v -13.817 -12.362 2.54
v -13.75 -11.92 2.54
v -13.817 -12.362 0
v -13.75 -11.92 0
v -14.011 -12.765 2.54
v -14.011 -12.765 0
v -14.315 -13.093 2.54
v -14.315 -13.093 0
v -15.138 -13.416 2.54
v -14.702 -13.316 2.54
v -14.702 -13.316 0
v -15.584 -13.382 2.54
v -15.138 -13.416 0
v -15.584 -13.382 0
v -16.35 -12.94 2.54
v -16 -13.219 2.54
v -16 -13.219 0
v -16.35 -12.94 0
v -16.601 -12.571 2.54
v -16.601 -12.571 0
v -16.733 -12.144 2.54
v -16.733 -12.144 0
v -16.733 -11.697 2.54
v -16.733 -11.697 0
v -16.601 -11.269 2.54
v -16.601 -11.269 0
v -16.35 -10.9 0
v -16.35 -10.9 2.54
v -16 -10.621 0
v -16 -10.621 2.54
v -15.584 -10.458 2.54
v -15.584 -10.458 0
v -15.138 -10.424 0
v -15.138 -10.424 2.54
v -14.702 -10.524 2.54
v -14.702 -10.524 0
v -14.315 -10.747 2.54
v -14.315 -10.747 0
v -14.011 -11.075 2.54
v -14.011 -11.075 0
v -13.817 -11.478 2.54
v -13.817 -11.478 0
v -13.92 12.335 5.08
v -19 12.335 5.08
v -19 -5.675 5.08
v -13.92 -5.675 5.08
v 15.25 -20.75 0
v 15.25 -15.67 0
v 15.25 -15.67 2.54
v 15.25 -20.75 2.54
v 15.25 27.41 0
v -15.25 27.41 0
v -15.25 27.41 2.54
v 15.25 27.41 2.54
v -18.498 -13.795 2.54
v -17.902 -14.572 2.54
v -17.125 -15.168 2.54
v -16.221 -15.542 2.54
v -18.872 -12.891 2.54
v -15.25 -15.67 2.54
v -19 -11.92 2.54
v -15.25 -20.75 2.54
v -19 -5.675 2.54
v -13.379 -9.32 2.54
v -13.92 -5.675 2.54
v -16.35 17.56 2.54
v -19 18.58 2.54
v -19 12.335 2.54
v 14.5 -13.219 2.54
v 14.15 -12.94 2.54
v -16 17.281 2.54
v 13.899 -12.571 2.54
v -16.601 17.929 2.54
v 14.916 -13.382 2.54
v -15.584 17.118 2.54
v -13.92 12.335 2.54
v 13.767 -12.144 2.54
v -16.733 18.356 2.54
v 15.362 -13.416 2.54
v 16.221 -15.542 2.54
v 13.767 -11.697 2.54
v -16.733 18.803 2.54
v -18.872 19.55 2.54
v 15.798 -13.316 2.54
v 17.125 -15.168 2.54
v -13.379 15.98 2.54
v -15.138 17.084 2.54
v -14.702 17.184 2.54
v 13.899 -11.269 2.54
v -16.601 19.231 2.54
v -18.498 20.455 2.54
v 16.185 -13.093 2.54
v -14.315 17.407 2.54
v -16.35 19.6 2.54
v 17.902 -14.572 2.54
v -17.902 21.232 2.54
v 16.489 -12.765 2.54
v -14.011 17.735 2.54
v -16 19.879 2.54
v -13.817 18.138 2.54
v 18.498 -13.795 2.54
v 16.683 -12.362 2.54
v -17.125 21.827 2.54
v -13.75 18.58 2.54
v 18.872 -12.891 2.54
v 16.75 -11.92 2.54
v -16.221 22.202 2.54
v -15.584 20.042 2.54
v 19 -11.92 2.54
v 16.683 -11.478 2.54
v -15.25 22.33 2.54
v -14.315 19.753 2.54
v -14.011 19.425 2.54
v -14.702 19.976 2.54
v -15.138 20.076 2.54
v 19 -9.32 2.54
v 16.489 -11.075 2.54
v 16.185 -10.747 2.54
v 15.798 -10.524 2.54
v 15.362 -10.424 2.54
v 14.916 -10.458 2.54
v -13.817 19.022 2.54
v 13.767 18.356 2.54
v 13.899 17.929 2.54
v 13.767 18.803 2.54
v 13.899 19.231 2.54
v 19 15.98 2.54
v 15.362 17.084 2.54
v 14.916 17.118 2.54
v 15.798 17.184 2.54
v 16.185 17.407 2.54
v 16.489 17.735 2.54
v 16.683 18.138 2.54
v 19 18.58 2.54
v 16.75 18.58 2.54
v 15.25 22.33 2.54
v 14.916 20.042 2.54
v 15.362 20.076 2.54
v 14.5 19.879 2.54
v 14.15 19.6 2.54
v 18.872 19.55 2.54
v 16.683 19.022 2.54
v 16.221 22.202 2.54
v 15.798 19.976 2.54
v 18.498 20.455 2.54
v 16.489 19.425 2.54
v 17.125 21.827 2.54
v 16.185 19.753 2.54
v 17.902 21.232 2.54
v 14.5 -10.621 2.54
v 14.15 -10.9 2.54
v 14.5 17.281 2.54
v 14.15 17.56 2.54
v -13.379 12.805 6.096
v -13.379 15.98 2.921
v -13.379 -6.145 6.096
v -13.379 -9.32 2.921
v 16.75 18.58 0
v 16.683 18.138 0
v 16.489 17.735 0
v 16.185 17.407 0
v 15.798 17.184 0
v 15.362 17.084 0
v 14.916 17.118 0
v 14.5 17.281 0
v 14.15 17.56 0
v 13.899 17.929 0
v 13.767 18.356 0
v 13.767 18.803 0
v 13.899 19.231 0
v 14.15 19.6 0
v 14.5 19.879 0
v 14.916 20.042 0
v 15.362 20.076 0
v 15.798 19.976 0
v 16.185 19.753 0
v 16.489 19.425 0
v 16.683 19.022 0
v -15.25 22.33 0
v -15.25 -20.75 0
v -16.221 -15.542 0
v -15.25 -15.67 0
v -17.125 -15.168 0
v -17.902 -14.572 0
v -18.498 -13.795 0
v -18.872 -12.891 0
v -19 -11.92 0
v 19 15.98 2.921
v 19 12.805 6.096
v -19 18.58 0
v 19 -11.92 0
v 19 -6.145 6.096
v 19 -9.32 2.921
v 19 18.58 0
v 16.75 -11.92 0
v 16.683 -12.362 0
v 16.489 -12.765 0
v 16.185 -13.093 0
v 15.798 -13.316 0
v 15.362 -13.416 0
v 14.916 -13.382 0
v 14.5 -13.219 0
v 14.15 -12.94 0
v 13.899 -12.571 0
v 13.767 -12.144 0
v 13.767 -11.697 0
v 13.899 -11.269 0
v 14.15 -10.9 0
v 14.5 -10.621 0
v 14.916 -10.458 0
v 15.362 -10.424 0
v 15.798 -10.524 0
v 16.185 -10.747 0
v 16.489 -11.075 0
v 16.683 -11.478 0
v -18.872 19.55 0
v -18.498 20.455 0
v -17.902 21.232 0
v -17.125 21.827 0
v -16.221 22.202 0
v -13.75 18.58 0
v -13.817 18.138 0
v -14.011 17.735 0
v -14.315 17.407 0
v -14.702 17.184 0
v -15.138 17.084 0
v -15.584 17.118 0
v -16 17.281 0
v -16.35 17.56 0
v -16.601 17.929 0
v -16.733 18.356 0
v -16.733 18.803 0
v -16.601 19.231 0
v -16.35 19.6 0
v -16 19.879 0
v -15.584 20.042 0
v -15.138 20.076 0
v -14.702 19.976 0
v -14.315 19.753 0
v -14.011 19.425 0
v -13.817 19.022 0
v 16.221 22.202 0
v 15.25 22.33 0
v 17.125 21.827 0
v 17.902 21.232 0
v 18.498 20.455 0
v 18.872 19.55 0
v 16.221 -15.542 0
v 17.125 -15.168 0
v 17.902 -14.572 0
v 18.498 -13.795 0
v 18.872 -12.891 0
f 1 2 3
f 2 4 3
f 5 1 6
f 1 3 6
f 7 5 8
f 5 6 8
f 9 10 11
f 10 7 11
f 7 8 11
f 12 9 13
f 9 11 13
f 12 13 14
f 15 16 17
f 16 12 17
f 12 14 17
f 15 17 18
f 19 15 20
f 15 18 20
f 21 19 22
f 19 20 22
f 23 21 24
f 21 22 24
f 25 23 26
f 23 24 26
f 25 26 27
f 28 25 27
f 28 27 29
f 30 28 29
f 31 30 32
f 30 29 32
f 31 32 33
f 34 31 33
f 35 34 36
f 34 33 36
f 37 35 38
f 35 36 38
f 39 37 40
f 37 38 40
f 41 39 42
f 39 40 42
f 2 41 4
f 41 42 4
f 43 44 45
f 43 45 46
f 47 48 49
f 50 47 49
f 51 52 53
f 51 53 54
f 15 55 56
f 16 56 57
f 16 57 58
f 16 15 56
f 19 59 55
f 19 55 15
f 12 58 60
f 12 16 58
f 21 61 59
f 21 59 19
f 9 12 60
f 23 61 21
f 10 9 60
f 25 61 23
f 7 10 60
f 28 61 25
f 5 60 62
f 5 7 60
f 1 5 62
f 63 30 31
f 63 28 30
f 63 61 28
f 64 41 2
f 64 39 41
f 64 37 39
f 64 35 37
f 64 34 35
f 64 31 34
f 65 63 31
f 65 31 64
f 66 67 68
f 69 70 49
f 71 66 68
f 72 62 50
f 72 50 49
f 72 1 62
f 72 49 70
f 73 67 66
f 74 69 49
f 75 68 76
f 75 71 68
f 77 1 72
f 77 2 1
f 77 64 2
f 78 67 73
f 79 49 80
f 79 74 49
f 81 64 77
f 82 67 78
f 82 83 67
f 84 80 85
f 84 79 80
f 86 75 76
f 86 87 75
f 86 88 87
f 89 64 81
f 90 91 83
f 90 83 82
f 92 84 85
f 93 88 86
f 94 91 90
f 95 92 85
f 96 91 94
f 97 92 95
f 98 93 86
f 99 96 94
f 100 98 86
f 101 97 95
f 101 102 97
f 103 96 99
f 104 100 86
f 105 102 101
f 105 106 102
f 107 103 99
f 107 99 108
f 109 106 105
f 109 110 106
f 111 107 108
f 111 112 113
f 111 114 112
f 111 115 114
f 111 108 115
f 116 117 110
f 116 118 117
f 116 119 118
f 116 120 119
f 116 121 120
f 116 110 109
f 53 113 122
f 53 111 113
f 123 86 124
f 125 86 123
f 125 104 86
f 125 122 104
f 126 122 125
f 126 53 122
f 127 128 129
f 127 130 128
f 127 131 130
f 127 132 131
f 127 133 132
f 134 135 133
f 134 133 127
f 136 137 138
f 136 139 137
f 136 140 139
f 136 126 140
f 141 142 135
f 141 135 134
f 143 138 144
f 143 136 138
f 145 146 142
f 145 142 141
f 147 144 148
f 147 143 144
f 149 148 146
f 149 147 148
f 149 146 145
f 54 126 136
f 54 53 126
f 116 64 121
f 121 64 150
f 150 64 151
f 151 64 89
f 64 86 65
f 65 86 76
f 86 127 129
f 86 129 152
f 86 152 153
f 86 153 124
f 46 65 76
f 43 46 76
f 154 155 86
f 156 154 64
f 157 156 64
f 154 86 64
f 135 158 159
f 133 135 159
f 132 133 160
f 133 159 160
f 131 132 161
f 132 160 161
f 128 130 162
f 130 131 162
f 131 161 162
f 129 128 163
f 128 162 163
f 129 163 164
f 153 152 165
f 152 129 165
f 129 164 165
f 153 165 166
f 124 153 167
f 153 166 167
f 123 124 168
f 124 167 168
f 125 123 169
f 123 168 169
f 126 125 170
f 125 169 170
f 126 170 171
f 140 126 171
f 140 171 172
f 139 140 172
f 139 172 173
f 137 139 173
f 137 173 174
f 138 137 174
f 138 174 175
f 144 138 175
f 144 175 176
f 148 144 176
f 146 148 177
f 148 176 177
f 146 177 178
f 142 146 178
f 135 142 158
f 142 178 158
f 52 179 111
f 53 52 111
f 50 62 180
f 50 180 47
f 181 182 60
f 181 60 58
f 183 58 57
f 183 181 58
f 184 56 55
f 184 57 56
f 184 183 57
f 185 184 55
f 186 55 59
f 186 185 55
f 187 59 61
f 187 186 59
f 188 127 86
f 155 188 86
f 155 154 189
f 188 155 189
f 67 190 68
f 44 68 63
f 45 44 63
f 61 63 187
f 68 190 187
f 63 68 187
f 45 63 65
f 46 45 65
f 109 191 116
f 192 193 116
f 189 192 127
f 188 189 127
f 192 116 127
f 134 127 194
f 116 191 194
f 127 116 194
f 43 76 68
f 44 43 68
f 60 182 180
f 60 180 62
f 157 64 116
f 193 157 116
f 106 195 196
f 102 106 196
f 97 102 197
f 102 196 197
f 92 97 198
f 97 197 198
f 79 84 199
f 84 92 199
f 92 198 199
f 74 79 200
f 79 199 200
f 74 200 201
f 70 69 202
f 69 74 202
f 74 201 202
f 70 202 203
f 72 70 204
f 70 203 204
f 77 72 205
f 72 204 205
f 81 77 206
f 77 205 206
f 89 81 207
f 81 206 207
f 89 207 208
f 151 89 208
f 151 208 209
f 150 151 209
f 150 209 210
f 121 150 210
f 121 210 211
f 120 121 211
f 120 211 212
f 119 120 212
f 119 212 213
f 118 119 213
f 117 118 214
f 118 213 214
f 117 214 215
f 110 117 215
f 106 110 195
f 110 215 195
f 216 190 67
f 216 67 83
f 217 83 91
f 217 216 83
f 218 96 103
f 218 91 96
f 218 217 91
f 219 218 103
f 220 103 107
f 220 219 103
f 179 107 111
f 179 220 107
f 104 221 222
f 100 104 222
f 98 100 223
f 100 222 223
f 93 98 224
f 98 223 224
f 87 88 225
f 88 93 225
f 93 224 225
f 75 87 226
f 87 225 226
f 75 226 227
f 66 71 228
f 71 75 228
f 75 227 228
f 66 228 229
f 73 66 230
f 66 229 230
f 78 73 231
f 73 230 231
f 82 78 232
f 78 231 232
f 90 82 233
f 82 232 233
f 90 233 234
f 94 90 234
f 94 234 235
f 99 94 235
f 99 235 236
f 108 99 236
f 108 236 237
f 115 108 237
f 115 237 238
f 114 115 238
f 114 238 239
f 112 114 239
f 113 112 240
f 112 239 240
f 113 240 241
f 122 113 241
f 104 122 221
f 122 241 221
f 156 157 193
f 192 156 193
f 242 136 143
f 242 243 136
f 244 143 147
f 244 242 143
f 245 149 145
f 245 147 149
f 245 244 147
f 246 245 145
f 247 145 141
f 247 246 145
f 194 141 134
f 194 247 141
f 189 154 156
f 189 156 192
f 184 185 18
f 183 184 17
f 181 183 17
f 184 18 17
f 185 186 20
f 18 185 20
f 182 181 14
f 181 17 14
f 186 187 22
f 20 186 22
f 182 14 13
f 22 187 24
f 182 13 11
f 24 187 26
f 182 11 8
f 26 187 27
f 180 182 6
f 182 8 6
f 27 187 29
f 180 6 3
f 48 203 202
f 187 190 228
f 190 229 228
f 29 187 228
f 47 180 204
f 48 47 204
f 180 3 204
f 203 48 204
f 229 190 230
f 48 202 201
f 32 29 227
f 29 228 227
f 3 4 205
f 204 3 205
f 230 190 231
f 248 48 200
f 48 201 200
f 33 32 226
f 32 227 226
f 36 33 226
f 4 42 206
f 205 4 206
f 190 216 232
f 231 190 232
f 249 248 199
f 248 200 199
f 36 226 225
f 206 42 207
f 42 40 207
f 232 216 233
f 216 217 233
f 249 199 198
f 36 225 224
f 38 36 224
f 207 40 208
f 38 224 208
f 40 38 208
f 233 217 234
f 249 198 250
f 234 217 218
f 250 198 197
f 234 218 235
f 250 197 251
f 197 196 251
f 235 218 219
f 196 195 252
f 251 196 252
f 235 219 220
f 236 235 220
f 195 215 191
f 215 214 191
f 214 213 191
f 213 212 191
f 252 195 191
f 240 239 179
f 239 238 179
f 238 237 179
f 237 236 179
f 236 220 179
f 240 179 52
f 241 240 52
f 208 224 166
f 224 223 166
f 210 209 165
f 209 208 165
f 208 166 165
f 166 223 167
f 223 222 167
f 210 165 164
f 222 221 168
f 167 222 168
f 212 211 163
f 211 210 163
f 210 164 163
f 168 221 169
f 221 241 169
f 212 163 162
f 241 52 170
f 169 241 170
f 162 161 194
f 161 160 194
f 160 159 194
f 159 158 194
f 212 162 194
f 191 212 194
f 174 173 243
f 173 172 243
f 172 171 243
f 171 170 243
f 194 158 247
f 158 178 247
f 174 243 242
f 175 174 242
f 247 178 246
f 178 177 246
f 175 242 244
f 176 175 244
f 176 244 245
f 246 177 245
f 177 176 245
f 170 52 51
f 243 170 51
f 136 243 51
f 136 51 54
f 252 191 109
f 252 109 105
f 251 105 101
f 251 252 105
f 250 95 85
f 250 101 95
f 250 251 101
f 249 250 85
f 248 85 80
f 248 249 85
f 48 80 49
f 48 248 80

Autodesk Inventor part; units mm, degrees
ref_plane "YZ Plane" through (0, 0, 0) normal (1, 0, 0) x (0, 1, 0)
ref_plane "XZ Plane" through (0, 0, 0) normal (0, 1, 0) x (-1, 0, 0)
ref_plane "XY Plane" through (0, 0, 0) normal (0, 0, 1) x (1, 0, 0)
sketch "Sketch1" plane through (0, 0, 0) normal (0, 0, 1) x (1, 0, 0)
  arc A0 (15.6734, 13.8392) -> (14.75, 12.1537) centre (16.75, 12.1537) ccw construction
  line L0 (15.6734, 13.8392) -> (18.0766, 15.3743) construction
  arc A1 (18.0766, 15.3743) -> (19, 17.0598) centre (17, 17.0598) ccw construction
  line L1 (19, 17.0598) -> (19, 30.7058) construction
  arc A2 (24.5861, 42.384) -> (19, 30.7058) centre (34, 30.7058) ccw construction
  line L2 (24.5861, 42.384) -> (28.2876, 45.3677) construction
  arc A3 (28.2876, 45.3677) -> (28.7404, 49.5861) centre (26.4048, 47.7034) ccw construction
  line L3 (28.7404, 49.5861) -> (26.2301, 52.7003) construction
  arc A4 (26.2301, 52.7003) -> (22.0117, 53.1532) centre (23.8944, 50.8175) ccw construction
  line L4 (22.0117, 53.1532) -> (11.4653, 44.6517) construction
  arc A5 (2.0515, 41.3299) -> (11.4653, 44.6517) centre (2.0515, 56.3299) ccw construction
  line L5 (2.0515, 41.3299) -> (-2.0515, 41.3299) construction
  arc A6 (-11.4653, 44.6517) -> (-2.0515, 41.3299) centre (-2.0515, 56.3299) ccw construction
  line L6 (-11.4653, 44.6517) -> (-22.0117, 53.1532) construction
  arc A7 (-22.0117, 53.1532) -> (-26.2301, 52.7003) centre (-23.8944, 50.8175) ccw construction
  line L7 (-26.2301, 52.7003) -> (-28.7404, 49.5861) construction
  arc A8 (-28.7404, 49.5861) -> (-28.2876, 45.3677) centre (-26.4048, 47.7034) ccw construction
  line L8 (-28.2876, 45.3677) -> (-24.5861, 42.384) construction
  arc A9 (-19, 30.7058) -> (-24.5861, 42.384) centre (-34, 30.7058) ccw construction
  line L9 (-19, 30.7058) -> (-19, 17.0598) construction
  arc A10 (-19, 17.0598) -> (-18.0766, 15.3743) centre (-17, 17.0598) ccw construction
  line L10 (-18.0766, 15.3743) -> (-15.6734, 13.8392) construction
  arc A11 (-14.75, 12.1537) -> (-15.6734, 13.8392) centre (-16.75, 12.1537) ccw construction
  line L11 (-14.75, 12.1537) -> (-14.75, -5.494) construction
  arc A12 (-15.6734, -7.1795) -> (-14.75, -5.494) centre (-16.75, -5.494) ccw construction
  line L12 (-15.6734, -7.1795) -> (-18.0766, -8.7146) construction
  arc A13 (-18.0766, -8.7146) -> (-19, -10.4001) centre (-17, -10.4001) ccw construction
  line L13 (-19, -10.4001) -> (-19, -30.7058) construction
  arc A14 (-24.5861, -42.384) -> (-19, -30.7058) centre (-34, -30.7058) ccw construction
  line L14 (-24.5861, -42.384) -> (-28.2876, -45.3677) construction
  arc A15 (-28.2876, -45.3677) -> (-28.7404, -49.5861) centre (-26.4048, -47.7034) ccw construction
  line L15 (-28.7404, -49.5861) -> (-26.2301, -52.7003) construction
  arc A16 (-26.2301, -52.7003) -> (-22.0117, -53.1532) centre (-23.8944, -50.8175) ccw construction
  line L16 (-22.0117, -53.1532) -> (-11.4653, -44.6517) construction
  arc A17 (-2.0515, -41.3299) -> (-11.4653, -44.6517) centre (-2.0515, -56.3299) ccw construction
  line L17 (-2.0515, -41.3299) -> (2.0515, -41.3299) construction
  arc A18 (11.4653, -44.6517) -> (2.0515, -41.3299) centre (2.0515, -56.3299) ccw construction
  line L18 (11.4653, -44.6517) -> (22.0117, -53.1532) construction
  arc A19 (22.0117, -53.1532) -> (26.2301, -52.7003) centre (23.8944, -50.8175) ccw construction
  line L19 (26.2301, -52.7003) -> (28.7404, -49.5861) construction
  arc A20 (28.7404, -49.5861) -> (28.2876, -45.3677) centre (26.4048, -47.7034) ccw construction
  line L20 (28.2876, -45.3677) -> (24.5861, -42.384) construction
  arc A21 (19, -30.7058) -> (24.5861, -42.384) centre (34, -30.7058) ccw construction
  line L21 (19, -30.7058) -> (19, -10.4001) construction
  arc A22 (19, -10.4001) -> (18.0766, -8.7146) centre (17, -10.4001) ccw construction
  line L22 (18.0766, -8.7146) -> (15.6734, -7.1795) construction
  arc A23 (14.75, -5.494) -> (15.6734, -7.1795) centre (16.75, -5.494) ccw construction
  line L23 (14.75, -5.494) -> (14.75, 12.1537) construction
  spline S0 degree 3 poles (8.2673, 8.7575) (8.2937, 7.6146) (8.3178, 6.4713) (8.3615, 4.1764) (8.3811, 3.024) (8.3985, 1.872) knots 0 0 0 0 0.342955 0.342955 0.688597 0.688597 0.688597 0.688597 construction
  arc A24 (7.2587, 0.991) -> (8.3985, 1.872) centre (7.4986, 1.8584) ccw construction
  line L24 (7.2587, 0.991) -> (3.6122, 1.9996) construction
  arc A25 (3.0306, 3.4932) -> (3.6122, 1.9996) centre (3.8788, 2.9634) ccw construction
  line L25 (3.0306, 3.4932) -> (6.6042, 9.2136) construction
  arc A26 (8.2673, 8.7575) -> (6.6042, 9.2136) centre (7.3675, 8.7367) ccw construction
  line L26 (-3.336, -2.3124) -> (-0.2664, -1.464) construction
  arc A27 (0.2664, -1.464) -> (-0.2664, -1.464) centre (0, -2.4278) ccw construction
  line L27 (0.2664, -1.464) -> (3.336, -2.3124) construction
  arc A28 (3.9177, -3.8061) -> (3.336, -2.3124) centre (3.0696, -3.2763) ccw construction
  line L28 (3.9177, -3.8061) -> (0.8481, -8.7198) construction
  arc A29 (-0.8481, -8.7198) -> (0.8481, -8.7198) centre (0, -8.19) ccw construction
  line L29 (-0.8481, -8.7198) -> (-3.9177, -3.8061) construction
  arc A30 (-3.336, -2.3124) -> (-3.9177, -3.8061) centre (-3.0696, -3.2763) ccw construction
  line L30 (6.2794, 18.6976) -> (1.9507, 19.9359) construction
  arc A31 (1.3777, 21.4271) -> (1.9507, 19.9359) centre (2.2258, 20.8973) ccw construction
  line L31 (1.3777, 21.4271) -> (4.6803, 26.7137) construction
  arc A32 (6.5163, 26.3393) -> (4.6803, 26.7137) centre (5.5284, 26.1839) ccw construction
  line L32 (6.5163, 26.3393) -> (7.5423, 19.8143) construction
  arc A33 (6.2794, 18.6976) -> (7.5423, 19.8143) centre (6.5544, 19.659) ccw construction
  line L33 (0.275, 16.6432) -> (4.3044, 15.4905) construction
  arc A34 (4.8775, 13.9992) -> (4.3044, 15.4905) centre (4.0294, 14.529) ccw construction
  line L34 (4.8775, 13.9992) -> (0.8481, 7.5492) construction
  arc A35 (-0.8481, 7.5492) -> (0.8481, 7.5492) centre (0, 8.0791) ccw construction
  line L35 (-0.8481, 7.5492) -> (-4.8775, 13.9992) construction
  arc A36 (-4.3044, 15.4905) -> (-4.8775, 13.9992) centre (-4.0294, 14.529) ccw construction
  line L36 (-4.3044, 15.4905) -> (-0.275, 16.6432) construction
  arc A37 (0.275, 16.6432) -> (-0.275, 16.6432) centre (0, 15.6817) ccw construction
  spline S1 degree 3 poles (-8.3985, 1.872) (-8.3811, 3.024) (-8.3615, 4.1764) (-8.3178, 6.4713) (-8.2937, 7.6146) (-8.2673, 8.7575) knots 0 0 0 0 0.345643 0.345643 0.688601 0.688601 0.688601 0.688601 construction
  arc A38 (-6.6042, 9.2136) -> (-8.2673, 8.7575) centre (-7.3675, 8.7367) ccw construction
  line L37 (-6.6042, 9.2136) -> (-3.0306, 3.4932) construction
  arc A39 (-3.6122, 1.9996) -> (-3.0306, 3.4932) centre (-3.8788, 2.9634) ccw construction
  line L38 (-3.6122, 1.9996) -> (-7.2587, 0.991) construction
  arc A40 (-8.3985, 1.872) -> (-7.2587, 0.991) centre (-7.4986, 1.8584) ccw construction
  line L39 (-4.6803, 26.7137) -> (-1.3777, 21.4271) construction
  arc A41 (-1.9507, 19.9359) -> (-1.3777, 21.4271) centre (-2.2258, 20.8973) ccw construction
  line L40 (-1.9507, 19.9359) -> (-6.2794, 18.6976) construction
  arc A42 (-7.5423, 19.8143) -> (-6.2794, 18.6976) centre (-6.5544, 19.659) ccw construction
  line L41 (-7.5423, 19.8143) -> (-6.5163, 26.3393) construction
  arc A43 (-4.6803, 26.7137) -> (-6.5163, 26.3393) centre (-5.5284, 26.1839) ccw construction
  circle A44 centre (-23.5925, -48.0053) radius 1.475 construction
  arc A45 (3, -16.1701) -> (-3, -16.1701) centre (0, -16.1701) ccw construction
  line L42 (3, -16.1701) -> (3, -28.3299) construction
  arc A46 (-3, -28.3299) -> (3, -28.3299) centre (0, -28.3299) ccw construction
  line L43 (-3, -28.3299) -> (-3, -16.1701) construction
  circle A47 centre (-23.5925, 48.0053) radius 1.475 construction
  circle A48 centre (-10, 13.3299) radius 1.475 construction
  circle A49 centre (-10, -6.6701) radius 1.475 construction
  circle A50 centre (-15.25, -11.9201) radius 1.5 projected
  circle A51 centre (-14.25, -40.4742) radius 1.475 construction
  circle A52 centre (23.5925, -48.0053) radius 1.475 construction
  circle A53 centre (15.25, -11.9201) radius 1.5 projected
  circle A54 centre (14.25, 40.4742) radius 1.475 construction
  circle A55 centre (10, 13.3299) radius 1.475 construction
  circle A56 centre (14.25, -40.4742) radius 1.475 construction
  circle A57 centre (15.25, 18.5799) radius 1.5 projected
  circle A58 centre (-15.25, 18.5799) radius 1.5 projected
  circle A59 centre (10, -6.6701) radius 1.475 construction
  circle A60 centre (-14.25, 40.4742) radius 1.475 construction
  circle A61 centre (23.5925, 48.0053) radius 1.475 construction
  line L44 (19, 22.3299) -> (15.25, 22.3299) construction
  line L45 (-19, 22.3299) -> (-19, 18.5799) construction
  line L46 (-19, -15.6701) -> (-15.25, -15.6701) construction
  line L47 (19, -15.6701) -> (19, -11.9201) construction
  arc A62 (19, 18.5799) -> (15.25, 22.3299) centre (15.25, 18.5799) ccw
  arc A63 (-15.25, 22.3299) -> (-19, 18.5799) centre (-15.25, 18.5799) ccw
  arc A64 (15.25, -15.6701) -> (19, -11.9201) centre (15.25, -11.9201) ccw
  arc A65 (-19, -11.9201) -> (-15.25, -15.6701) centre (-15.25, -11.9201) ccw
  arc A66 (-19, 18.5799) -> (-15.25, 22.3299) centre (-15.25, 18.5799) ccw construction
  arc A67 (15.25, 22.3299) -> (19, 18.5799) centre (15.25, 18.5799) ccw construction
  arc A68 (19, -11.9201) -> (15.25, -15.6701) centre (15.25, -11.9201) ccw construction
  arc A69 (-15.25, -15.6701) -> (-19, -11.9201) centre (-15.25, -11.9201) ccw construction
  line L48 (19, 18.5799) -> (19, 22.3299) construction
  line L49 (15.25, 22.3299) -> (-15.25, 22.3299)
  line L50 (-15.25, 22.3299) -> (-19, 22.3299) construction
  line L51 (-19, 18.5799) -> (-19, -11.9201)
  line L52 (-19, -11.9201) -> (-19, -15.6701) construction
  line L53 (-15.25, -15.6701) -> (15.25, -15.6701)
  line L54 (15.25, -15.6701) -> (19, -15.6701) construction
  line L55 (19, -11.9201) -> (19, 18.5799)
  point P0 (0, 0)
  dimension "d0" = 3.75
  dimension "d1" = 3.75
  dimension "d2" = 3.75
extrude "Extrusion1" add sketch "Sketch1" along normal blind 2.54
sketch "Sketch2" plane through (0, 0, 2.54) normal (0, 0, 1) x (1, 0, 0)
  line L0 (-13.92, 12.3346) -> (-19, 12.3346)
  line L1 (-19, 12.3346) -> (-19, -5.6749)
  line L2 (-19, -5.6749) -> (-13.92, -5.6749)
  line L3 (-13.92, -5.6749) -> (-13.92, 12.3346)
  line L4 (15.25, 22.3299) -> (-15.25, 22.3299) construction
  line L5 (-15.25, -15.6701) -> (15.25, -15.6701) construction
  line L6 (-19, 18.5799) -> (-19, -11.9201) construction
  point P0 (0, 0)
  dimension "d5" = 9.9953
  dimension "d6" = 9.9953
  dimension "d7" = 5.08
extrude "Extrusion2" add sketch "Sketch2" along normal blind 2.54
sketch "Sketch3" plane through (0, 0, 2.54) normal (0, 0, 1) x (1, 0, 0)
  line L0 (19, -11.9201) -> (19, 18.5799) projected
  line L1 (19, 15.9799) -> (-13.3786, 15.9799)
  line L2 (-13.3786, 15.9799) -> (-13.3786, -9.3201)
  line L3 (-13.3786, -9.3201) -> (19, -9.3201)
  line L4 (19, -9.3201) -> (19, 15.9799)
  line L5 (15.25, 22.3299) -> (-15.25, 22.3299) projected
  line L6 (-15.25, -15.6701) -> (15.25, -15.6701) projected
  point P0 (0, 0)
  dimension "d10" = 6.35
  dimension "d11" = 6.35
extrude "Extrusion3" add sketch "Sketch3" along normal blind 3.556
chamfer "Chamfer1" distance 3.175 angle 45 1 edges at (2.8107, 15.9799, 6.096)
chamfer "Chamfer2" distance 3.175 angle 45 1 edges at (2.8107, -9.3201, 6.096)
sketch "Sketch4" plane through (-15.25, 22.3299, 0) normal (0, 1, 0) x (1, 0, 0)
  line L0 (30.5, 0) -> (0, 0) projected
  line L1 (0, 0) -> (0, -2.54) projected
  line L2 (30.5, -2.54) -> (0, -2.54) projected
  line L3 (30.5, 0) -> (30.5, -2.54) projected
  point P0 (15.25, 0)
extrude "Extrusion4" add sketch "Sketch4" along normal blind 5.08
sketch "Sketch5" plane through (-15.25, -15.6701, 0) normal (0, -1, 0) x (1, 0, 0)
  line L0 (0, 0) -> (30.5, 0) projected
  line L1 (30.5, 0) -> (30.5, 2.54) projected
  line L2 (0, 2.54) -> (30.5, 2.54) projected
  line L3 (0, 0) -> (0, 2.54) projected
  point P0 (15.25, 0)
extrude "Extrusion5" add sketch "Sketch5" along normal blind 5.08
equation "\"d1\" = d0"
equation "\"d2\" = d0"
equation "\"d6\" = d5"
equation "\"d11\" = d10"
properties part number "Velox ESC"
